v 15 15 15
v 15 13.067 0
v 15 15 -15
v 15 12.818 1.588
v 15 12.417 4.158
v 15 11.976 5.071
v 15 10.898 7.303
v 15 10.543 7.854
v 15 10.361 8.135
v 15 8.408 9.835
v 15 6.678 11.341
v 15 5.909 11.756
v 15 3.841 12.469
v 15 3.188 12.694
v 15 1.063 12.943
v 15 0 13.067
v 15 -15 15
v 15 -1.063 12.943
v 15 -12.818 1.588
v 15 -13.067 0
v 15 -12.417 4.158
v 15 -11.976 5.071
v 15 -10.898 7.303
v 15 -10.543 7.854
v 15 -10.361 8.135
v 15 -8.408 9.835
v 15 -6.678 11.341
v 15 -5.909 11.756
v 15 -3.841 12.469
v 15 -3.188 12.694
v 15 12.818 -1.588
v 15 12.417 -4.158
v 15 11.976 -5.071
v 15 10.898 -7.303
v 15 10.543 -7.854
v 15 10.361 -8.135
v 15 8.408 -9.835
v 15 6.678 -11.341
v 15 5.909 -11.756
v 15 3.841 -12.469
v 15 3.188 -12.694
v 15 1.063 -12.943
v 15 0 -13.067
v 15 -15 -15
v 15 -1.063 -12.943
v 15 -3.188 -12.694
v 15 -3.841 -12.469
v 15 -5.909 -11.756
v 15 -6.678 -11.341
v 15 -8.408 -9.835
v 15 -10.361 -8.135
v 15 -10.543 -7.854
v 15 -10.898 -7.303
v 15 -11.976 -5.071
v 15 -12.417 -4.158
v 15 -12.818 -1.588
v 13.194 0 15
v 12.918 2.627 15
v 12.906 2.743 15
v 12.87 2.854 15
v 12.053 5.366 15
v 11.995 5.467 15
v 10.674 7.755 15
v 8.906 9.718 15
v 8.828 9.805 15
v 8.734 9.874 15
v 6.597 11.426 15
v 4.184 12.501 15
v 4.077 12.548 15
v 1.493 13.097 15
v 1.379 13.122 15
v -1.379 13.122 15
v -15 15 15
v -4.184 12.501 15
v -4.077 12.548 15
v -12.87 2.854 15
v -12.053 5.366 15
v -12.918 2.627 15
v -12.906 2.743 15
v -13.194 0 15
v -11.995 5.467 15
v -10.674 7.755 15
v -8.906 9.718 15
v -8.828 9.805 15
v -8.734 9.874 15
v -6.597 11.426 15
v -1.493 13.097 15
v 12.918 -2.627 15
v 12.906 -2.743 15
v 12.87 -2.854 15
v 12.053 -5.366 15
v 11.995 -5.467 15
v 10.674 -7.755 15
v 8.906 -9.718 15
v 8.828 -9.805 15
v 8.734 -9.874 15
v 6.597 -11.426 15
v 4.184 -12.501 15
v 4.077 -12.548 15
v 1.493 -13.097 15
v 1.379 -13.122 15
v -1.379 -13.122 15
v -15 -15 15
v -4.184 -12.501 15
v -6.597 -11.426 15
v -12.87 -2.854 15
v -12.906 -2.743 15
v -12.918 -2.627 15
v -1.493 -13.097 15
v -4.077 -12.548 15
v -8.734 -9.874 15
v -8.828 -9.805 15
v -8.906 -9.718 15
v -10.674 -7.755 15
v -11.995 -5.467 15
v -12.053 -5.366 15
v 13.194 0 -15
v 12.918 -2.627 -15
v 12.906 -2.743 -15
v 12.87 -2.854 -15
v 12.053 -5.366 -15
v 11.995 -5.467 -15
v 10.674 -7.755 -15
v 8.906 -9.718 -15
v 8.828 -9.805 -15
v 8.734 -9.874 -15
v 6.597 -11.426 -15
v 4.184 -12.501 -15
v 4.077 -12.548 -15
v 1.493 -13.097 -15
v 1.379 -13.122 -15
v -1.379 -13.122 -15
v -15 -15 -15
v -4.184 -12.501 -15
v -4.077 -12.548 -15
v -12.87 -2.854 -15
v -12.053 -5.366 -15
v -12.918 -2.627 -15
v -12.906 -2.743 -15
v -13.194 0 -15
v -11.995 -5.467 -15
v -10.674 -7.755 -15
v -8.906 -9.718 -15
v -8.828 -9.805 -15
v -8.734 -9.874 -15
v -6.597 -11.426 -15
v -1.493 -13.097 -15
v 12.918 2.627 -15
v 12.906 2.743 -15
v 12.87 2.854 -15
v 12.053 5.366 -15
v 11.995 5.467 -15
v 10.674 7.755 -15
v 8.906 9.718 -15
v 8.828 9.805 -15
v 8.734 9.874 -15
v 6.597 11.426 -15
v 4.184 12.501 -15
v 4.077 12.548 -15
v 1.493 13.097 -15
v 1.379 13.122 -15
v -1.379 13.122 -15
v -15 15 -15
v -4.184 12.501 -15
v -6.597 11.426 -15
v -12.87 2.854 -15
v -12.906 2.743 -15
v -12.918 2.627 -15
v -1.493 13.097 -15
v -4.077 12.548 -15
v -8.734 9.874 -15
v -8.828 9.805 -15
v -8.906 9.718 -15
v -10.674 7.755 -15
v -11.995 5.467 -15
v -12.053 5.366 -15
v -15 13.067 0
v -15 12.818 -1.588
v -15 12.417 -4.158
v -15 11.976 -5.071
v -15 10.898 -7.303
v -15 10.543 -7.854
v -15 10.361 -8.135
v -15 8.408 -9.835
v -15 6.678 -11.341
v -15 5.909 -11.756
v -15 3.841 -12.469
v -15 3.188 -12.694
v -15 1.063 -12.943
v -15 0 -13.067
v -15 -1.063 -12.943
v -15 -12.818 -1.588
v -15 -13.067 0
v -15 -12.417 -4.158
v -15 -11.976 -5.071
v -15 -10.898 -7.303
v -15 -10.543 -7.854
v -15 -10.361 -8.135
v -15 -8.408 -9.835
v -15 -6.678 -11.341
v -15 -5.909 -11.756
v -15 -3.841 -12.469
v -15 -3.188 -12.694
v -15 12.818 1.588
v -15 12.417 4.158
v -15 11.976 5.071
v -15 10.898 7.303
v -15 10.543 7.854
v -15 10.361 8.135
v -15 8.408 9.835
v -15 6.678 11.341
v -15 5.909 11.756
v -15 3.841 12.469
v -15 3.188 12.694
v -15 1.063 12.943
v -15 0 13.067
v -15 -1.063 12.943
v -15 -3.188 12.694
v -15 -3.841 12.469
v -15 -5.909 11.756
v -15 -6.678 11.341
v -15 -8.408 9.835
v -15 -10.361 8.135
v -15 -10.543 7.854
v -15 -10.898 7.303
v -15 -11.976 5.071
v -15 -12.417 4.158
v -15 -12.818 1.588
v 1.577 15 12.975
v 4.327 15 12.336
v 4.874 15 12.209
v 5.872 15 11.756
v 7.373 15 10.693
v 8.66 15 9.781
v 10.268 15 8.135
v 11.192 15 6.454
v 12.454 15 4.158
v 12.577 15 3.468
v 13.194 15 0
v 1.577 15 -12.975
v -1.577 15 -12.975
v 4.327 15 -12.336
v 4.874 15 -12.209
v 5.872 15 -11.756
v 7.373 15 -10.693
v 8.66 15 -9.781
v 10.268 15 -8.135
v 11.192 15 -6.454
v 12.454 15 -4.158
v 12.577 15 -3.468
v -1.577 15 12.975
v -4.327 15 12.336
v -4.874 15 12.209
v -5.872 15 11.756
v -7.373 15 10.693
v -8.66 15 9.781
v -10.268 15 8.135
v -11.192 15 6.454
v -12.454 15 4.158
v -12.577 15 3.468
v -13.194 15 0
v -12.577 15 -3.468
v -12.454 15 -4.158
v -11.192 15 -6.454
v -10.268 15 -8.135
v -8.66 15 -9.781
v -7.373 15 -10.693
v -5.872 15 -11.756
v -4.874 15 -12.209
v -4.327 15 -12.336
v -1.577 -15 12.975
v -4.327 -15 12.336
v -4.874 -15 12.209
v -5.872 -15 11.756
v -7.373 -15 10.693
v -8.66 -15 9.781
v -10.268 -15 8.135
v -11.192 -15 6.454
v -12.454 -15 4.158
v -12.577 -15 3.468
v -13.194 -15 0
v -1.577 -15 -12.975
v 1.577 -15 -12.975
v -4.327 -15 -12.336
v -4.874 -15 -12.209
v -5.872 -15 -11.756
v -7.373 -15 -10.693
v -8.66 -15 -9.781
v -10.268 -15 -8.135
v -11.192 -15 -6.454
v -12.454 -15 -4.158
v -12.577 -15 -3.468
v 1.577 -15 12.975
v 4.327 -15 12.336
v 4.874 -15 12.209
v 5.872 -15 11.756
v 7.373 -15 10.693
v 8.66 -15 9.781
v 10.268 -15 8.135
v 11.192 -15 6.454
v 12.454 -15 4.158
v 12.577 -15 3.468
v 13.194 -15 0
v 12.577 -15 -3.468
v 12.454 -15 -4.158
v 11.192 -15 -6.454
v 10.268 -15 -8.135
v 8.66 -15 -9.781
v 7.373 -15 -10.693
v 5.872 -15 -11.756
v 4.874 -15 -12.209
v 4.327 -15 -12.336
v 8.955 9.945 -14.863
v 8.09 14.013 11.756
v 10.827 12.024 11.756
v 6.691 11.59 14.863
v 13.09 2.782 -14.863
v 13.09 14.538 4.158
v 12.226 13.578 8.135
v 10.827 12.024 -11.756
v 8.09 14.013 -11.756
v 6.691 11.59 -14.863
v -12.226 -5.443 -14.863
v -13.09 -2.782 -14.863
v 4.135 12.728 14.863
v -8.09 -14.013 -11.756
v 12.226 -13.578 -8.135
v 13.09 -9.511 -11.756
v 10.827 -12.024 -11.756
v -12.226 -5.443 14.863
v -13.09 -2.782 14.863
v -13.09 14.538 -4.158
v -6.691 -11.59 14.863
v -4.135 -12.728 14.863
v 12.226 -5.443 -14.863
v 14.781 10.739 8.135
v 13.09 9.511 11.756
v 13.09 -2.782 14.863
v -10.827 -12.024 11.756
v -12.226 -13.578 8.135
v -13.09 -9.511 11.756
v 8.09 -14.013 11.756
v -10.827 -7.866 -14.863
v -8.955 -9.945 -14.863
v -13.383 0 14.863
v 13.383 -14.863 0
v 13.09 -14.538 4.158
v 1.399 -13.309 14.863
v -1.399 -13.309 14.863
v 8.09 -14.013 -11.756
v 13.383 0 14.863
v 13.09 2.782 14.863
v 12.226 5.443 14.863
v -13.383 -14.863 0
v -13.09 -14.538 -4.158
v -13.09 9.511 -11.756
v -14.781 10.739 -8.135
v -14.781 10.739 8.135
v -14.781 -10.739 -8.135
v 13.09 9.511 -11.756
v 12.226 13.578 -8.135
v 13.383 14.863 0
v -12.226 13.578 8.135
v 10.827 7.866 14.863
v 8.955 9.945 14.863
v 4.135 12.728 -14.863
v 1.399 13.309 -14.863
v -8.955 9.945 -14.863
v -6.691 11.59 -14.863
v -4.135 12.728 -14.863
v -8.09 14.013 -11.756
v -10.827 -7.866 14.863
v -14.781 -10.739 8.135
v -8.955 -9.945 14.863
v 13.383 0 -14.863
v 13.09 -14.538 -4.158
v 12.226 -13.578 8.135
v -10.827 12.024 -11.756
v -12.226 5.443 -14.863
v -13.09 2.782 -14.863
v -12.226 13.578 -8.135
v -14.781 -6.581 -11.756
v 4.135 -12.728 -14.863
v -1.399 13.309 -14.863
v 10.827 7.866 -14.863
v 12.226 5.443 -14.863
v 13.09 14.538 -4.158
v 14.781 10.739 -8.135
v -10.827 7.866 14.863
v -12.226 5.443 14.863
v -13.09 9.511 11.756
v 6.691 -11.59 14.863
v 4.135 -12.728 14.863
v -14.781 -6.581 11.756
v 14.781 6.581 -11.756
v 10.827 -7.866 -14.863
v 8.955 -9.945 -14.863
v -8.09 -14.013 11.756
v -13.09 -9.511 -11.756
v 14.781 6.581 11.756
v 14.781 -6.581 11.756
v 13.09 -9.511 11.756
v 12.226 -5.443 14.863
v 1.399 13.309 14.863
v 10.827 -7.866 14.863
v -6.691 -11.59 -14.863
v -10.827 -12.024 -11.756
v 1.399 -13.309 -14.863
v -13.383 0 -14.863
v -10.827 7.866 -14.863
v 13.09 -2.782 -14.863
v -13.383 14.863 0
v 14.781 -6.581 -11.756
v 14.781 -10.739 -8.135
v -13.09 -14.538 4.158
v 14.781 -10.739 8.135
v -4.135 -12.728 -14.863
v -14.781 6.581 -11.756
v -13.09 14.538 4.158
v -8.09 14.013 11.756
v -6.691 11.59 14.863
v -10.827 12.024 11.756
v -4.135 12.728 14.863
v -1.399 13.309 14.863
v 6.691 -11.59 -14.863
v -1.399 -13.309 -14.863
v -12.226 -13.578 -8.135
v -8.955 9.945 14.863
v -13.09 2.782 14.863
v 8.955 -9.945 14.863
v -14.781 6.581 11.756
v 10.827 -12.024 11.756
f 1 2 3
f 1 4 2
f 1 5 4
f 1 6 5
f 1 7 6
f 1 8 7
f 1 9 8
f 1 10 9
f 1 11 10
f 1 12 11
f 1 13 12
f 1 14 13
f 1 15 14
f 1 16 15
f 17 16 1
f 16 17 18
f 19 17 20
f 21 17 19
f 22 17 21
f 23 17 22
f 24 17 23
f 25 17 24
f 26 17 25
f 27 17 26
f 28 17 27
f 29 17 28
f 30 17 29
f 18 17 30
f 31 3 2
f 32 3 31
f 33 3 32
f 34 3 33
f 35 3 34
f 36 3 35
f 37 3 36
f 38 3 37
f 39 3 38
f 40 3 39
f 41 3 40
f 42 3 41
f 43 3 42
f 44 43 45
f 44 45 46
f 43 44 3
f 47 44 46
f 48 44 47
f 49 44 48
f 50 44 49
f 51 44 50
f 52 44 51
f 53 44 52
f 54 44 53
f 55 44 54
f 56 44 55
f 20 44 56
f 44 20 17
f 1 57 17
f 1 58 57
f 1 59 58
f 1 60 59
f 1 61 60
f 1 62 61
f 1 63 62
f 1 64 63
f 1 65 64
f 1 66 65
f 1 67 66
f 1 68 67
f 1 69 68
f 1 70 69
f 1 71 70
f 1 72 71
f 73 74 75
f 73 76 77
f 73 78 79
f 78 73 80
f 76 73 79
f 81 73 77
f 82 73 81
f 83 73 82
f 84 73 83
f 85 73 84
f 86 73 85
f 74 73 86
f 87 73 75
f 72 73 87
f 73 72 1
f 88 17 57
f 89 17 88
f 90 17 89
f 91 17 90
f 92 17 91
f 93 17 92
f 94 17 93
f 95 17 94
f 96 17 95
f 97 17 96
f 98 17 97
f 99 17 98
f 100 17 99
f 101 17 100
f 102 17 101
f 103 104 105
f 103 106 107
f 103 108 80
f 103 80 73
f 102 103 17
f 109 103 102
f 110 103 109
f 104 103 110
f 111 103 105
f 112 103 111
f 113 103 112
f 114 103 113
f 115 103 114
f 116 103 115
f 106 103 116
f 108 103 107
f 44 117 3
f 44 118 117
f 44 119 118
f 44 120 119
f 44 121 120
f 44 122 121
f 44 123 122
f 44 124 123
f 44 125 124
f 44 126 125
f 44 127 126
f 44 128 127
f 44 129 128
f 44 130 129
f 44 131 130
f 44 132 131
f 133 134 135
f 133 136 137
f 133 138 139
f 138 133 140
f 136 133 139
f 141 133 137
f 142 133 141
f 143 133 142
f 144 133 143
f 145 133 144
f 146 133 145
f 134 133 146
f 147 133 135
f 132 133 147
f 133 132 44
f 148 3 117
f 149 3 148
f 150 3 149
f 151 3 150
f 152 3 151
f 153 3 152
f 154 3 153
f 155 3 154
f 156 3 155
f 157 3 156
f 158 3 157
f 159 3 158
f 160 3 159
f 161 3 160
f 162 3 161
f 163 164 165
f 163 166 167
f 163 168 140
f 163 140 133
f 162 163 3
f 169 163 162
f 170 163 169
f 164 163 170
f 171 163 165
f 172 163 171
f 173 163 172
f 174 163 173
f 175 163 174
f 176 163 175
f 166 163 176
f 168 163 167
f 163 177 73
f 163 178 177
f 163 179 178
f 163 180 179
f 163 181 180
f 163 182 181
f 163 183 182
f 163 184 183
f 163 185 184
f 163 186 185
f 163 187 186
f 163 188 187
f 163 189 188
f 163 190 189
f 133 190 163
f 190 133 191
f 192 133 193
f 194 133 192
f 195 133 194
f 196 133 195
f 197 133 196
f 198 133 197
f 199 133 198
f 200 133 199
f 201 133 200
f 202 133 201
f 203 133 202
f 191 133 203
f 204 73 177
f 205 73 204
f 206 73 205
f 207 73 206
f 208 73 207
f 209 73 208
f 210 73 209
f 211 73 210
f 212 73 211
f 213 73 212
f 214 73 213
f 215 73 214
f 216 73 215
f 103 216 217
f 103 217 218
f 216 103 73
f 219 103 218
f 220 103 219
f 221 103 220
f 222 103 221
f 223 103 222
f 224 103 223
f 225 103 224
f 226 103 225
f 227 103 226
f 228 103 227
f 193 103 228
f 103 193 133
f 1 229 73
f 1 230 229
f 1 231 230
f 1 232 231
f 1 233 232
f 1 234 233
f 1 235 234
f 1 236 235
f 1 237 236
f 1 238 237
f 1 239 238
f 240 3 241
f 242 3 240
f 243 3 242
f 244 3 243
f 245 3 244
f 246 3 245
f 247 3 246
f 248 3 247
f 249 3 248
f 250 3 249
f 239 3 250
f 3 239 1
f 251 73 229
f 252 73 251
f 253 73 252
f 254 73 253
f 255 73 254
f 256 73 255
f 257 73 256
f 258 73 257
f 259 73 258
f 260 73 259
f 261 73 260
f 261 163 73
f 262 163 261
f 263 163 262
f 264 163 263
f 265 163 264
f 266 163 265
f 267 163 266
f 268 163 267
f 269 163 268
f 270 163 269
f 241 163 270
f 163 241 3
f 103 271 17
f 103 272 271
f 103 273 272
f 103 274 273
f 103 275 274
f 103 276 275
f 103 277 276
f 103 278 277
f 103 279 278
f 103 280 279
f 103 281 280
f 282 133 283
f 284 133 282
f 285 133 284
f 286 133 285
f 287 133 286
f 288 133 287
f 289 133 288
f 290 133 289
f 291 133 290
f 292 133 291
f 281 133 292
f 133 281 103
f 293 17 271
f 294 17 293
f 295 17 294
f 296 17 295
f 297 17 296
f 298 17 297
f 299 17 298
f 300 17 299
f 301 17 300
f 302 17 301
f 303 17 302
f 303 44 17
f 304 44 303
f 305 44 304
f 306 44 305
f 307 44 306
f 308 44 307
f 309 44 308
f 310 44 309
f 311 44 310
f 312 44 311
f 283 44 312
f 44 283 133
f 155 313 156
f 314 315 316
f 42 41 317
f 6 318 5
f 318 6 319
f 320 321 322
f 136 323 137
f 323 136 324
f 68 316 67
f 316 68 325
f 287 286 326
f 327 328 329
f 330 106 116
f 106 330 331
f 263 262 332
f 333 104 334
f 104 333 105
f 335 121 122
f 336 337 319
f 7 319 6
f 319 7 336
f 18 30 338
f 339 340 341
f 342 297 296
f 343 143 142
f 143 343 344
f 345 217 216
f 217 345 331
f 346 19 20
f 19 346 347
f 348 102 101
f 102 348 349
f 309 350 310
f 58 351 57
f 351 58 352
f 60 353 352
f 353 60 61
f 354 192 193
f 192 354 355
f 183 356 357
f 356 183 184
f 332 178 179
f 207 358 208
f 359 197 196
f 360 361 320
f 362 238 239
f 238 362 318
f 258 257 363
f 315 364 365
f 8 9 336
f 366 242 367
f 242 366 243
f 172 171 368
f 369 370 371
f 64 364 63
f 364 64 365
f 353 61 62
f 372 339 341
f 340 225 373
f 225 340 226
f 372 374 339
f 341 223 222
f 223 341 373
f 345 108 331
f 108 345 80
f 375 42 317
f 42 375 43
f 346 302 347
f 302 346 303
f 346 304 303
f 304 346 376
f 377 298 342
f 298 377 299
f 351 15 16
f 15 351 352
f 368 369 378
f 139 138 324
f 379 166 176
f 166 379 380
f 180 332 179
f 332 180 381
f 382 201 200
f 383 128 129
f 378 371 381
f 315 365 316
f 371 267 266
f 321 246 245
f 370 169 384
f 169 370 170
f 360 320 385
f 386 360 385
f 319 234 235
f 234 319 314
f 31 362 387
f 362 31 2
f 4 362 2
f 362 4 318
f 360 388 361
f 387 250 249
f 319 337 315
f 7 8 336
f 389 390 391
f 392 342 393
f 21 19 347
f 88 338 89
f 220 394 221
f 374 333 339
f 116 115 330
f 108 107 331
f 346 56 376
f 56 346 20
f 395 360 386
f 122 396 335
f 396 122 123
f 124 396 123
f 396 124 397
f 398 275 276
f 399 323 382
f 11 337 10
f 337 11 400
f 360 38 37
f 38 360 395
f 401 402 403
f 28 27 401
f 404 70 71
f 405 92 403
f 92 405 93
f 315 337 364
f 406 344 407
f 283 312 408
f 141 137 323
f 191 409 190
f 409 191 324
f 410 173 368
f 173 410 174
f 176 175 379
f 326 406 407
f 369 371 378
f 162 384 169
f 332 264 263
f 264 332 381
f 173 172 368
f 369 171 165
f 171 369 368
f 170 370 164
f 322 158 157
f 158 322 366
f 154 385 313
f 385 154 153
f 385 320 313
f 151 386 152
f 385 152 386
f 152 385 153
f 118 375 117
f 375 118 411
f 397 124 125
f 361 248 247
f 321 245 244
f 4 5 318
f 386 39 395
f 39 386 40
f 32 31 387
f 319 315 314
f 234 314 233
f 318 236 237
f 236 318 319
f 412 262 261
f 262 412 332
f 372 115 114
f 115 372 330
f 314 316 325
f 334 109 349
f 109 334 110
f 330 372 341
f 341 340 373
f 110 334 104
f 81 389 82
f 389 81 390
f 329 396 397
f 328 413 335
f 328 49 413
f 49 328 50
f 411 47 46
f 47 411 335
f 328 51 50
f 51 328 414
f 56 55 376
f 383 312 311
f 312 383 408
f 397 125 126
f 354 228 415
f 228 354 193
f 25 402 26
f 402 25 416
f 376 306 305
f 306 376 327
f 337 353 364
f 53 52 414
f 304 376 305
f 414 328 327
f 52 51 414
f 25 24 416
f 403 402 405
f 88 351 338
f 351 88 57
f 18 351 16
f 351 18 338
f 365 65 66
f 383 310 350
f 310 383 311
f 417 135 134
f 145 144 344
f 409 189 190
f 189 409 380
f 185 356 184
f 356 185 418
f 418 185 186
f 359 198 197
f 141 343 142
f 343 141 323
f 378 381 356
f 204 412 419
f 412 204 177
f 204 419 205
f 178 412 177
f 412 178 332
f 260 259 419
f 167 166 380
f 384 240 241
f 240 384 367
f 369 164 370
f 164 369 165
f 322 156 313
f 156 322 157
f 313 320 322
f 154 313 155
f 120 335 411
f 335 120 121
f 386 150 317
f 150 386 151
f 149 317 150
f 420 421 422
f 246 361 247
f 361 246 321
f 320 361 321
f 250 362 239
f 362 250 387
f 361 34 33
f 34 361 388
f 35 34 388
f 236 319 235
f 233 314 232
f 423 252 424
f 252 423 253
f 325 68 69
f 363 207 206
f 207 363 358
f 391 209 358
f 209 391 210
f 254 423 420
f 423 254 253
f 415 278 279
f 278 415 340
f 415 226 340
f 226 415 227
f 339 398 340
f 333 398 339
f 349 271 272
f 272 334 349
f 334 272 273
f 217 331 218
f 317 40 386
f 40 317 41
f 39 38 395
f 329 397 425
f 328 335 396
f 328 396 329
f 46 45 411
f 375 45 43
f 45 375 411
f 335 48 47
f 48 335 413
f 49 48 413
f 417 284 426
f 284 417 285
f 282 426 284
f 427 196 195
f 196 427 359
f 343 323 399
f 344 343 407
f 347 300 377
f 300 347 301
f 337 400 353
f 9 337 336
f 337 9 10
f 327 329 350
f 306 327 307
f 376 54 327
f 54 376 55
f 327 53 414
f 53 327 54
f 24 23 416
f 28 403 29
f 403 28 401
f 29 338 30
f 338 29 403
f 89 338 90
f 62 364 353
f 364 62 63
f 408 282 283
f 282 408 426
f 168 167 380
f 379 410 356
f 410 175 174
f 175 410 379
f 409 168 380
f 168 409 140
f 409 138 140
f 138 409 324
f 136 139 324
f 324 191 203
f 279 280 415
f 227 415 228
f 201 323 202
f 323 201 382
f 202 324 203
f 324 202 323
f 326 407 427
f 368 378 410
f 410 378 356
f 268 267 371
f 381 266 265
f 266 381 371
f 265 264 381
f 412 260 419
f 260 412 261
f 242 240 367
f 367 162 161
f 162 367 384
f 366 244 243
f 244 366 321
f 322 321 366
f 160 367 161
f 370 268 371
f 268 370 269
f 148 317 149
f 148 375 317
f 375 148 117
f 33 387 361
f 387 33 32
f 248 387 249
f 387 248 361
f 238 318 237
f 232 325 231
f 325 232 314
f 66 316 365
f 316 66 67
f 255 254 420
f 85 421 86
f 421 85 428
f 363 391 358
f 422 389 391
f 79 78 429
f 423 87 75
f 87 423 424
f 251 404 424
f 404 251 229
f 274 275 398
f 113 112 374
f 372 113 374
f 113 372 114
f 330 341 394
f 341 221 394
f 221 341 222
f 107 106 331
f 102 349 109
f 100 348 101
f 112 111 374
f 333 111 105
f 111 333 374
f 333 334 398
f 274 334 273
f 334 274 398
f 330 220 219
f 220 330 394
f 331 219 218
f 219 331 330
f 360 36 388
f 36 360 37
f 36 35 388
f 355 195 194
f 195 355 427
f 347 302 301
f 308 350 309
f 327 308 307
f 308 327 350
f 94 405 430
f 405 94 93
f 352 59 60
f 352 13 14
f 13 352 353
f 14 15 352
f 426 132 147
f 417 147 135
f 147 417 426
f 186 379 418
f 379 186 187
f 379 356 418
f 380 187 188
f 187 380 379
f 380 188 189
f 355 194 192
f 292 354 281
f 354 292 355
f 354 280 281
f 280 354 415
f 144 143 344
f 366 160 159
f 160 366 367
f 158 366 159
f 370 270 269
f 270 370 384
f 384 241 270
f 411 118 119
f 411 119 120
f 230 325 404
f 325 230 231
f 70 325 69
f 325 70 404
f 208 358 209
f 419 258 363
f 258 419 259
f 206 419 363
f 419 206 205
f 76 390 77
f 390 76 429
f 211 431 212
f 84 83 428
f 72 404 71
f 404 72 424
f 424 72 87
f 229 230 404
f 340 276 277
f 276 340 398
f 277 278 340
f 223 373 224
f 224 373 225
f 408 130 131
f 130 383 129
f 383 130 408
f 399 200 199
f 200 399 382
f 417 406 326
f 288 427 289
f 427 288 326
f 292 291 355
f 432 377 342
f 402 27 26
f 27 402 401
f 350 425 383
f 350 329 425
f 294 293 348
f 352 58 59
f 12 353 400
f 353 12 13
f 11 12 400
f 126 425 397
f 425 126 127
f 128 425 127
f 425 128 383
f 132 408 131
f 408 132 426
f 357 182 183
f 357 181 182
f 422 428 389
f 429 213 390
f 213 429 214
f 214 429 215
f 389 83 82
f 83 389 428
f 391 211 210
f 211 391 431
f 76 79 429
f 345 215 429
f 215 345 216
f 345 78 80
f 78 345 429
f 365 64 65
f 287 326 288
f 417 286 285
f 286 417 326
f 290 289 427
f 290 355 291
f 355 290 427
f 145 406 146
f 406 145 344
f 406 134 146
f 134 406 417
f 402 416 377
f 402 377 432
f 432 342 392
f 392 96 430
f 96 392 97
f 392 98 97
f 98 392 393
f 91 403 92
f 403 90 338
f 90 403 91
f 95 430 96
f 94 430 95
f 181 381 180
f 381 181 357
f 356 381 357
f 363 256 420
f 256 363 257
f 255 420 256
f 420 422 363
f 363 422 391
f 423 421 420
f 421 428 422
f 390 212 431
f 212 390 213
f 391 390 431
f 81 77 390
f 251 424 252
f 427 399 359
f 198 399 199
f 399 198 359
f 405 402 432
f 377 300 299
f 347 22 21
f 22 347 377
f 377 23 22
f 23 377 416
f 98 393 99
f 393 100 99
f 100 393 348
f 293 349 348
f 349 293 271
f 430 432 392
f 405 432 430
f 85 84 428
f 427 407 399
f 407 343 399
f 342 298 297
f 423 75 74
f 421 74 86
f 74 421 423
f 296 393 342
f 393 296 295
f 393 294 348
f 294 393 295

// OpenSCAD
//created with rubyscad 1.0

difference() {
   cube(size = 30, center = true); 
   sphere(r = 20); 
}
